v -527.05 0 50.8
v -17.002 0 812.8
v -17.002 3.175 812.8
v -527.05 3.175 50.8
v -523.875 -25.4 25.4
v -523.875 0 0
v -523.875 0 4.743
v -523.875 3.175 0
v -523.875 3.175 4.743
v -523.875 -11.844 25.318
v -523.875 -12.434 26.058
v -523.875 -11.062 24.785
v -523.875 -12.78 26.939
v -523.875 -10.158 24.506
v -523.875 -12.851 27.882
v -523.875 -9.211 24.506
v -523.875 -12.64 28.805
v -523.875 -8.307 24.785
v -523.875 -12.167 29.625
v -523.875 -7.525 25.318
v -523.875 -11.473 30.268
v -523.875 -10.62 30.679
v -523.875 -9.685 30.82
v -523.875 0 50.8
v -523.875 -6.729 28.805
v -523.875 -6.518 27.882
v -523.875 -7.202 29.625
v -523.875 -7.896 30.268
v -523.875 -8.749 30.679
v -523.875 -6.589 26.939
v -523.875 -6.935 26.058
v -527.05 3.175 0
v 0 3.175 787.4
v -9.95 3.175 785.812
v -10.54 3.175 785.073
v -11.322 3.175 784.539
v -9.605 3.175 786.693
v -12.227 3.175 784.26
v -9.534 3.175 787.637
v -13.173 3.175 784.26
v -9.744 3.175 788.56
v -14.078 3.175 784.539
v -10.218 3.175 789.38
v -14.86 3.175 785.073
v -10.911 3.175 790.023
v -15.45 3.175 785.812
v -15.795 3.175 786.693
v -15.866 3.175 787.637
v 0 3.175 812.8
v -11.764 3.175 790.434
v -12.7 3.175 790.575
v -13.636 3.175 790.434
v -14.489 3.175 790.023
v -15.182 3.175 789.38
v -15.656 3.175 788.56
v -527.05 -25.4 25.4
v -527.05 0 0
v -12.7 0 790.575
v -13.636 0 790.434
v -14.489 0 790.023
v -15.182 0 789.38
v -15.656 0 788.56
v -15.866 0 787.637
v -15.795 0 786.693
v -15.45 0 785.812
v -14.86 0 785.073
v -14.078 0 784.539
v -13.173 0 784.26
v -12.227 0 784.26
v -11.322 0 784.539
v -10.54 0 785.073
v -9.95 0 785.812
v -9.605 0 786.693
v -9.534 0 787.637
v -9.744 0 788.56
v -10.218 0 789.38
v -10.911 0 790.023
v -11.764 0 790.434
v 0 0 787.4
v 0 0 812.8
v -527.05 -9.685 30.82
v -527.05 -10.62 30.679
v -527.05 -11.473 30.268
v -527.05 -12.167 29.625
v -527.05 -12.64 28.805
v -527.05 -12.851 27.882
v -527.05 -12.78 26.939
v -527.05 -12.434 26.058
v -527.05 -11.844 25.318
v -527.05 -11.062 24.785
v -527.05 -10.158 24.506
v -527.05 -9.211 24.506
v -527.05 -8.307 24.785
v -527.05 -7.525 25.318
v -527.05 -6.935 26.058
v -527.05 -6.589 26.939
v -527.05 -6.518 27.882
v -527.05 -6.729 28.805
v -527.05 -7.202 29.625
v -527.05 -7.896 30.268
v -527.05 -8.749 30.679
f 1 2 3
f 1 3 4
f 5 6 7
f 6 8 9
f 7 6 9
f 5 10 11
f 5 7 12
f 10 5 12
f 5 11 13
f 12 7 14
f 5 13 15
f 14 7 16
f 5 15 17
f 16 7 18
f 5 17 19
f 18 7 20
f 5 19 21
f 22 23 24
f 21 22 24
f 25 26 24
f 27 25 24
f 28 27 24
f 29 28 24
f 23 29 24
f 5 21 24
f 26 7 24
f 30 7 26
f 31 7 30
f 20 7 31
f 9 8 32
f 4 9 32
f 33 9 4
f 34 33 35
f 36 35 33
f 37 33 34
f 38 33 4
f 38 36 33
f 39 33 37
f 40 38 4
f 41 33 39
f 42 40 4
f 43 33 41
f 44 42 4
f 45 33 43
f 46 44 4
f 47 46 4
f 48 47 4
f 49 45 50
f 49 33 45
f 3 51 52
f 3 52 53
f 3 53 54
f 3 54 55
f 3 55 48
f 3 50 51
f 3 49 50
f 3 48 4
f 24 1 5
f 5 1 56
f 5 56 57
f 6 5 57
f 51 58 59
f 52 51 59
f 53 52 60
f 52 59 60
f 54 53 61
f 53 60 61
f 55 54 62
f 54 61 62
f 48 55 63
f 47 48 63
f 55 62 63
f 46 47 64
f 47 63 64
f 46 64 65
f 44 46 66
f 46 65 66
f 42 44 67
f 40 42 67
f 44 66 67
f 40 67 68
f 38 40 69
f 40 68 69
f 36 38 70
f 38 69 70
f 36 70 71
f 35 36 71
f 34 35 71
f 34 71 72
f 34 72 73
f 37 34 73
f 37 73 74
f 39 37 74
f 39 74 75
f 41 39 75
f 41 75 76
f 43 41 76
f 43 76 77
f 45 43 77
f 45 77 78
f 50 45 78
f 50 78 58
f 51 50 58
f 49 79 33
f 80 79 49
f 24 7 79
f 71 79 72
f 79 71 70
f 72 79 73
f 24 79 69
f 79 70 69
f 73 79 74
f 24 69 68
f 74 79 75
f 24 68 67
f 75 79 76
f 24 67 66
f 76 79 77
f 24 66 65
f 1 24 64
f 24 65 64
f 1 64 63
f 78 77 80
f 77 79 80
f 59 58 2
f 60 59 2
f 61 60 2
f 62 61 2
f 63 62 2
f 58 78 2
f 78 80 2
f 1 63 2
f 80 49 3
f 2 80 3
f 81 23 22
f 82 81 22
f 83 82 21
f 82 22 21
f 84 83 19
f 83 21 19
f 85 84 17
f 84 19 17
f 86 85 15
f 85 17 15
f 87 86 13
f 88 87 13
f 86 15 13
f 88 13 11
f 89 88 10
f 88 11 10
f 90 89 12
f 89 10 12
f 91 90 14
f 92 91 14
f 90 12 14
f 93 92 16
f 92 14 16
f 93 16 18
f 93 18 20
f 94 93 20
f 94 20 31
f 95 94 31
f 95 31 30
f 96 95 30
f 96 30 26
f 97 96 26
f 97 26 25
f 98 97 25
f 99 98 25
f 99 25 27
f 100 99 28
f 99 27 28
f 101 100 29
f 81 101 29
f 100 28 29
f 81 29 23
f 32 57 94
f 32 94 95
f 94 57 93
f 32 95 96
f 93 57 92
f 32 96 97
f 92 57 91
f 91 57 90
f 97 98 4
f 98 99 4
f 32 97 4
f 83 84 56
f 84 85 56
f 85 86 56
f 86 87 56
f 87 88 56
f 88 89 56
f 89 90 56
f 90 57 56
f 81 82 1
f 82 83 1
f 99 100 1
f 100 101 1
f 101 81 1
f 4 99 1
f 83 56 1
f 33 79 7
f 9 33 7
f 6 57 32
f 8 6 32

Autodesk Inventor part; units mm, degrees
ref_plane "YZ Plane" through (0, 0, 0) normal (1, 0, 0) x (0, 1, 0)
ref_plane "XZ Plane" through (0, 0, 0) normal (0, 1, 0) x (-1, 0, 0)
ref_plane "XY Plane" through (0, 0, 0) normal (0, 0, 1) x (1, 0, 0)
sketch "Sketch1" plane through (0, 0, 0) normal (0, 1, 0) x (-1, 0, 0)
  line L0 (0, 0) -> (527.05, 0) construction
  line L1 (527.05, 0) -> (527.05, 787.4) construction
  line L2 (527.05, 787.4) -> (0, 787.4) construction
  line L3 (0, 787.4) -> (0, 0) construction
  line L4 (0, 787.4) -> (527.05, 0)
  line L5 (527.05, 0) -> (527.05, 50.8)
  line L6 (527.05, 0) -> (577.85, 0) construction
  line L7 (0, 787.4) -> (0, 838.2)
  line L8 (0, 787.4) -> (50.8, 787.4) construction
  line L9 (0, 838.2) -> (527.05, 50.8)
  dimension "d0" = 527.05
  dimension "d1" = 787.4
  dimension "d2" = 50.8
  dimension "d3" = 90
  dimension "d4" = 50.8
  dimension "d5" = 90
extrude "Extrusion1" add sketch "Sketch1" along normal blind 3.175
sketch "Sketch6" plane through (-527.05, 0, 0) normal (-1, 0, 0) x (0, 0, 1)
  line L0 (50.8, 0) -> (0, 0) projected
  line L1 (50.8, 0) -> (50.8, 3.175) projected
  line L2 (0, 3.175) -> (50.8, 3.175) projected
  line L3 (0, 0) -> (0, 3.175) projected
  line L4 (50.8, 0) -> (25.4, -25.4)
  line L5 (50.8, 0) -> (86.721, 0) construction
  line L6 (25.4, -25.4) -> (0, 0)
  dimension "d33" = 135
extrude "Extrusion4" add sketch "Sketch6" against normal blind 3.175
sketch "Sketch8" plane through (0, 3.175, 0) normal (0, 1, 0) x (1, 0, 0)
  line L0 (-527.05, 0) -> (-527.05, -50.8) projected
  line L1 (-527.05, -50.8) -> (0, -838.2) projected
  line L2 (0, -838.2) -> (0, -787.4) projected
  line L3 (0, -787.4) -> (-523.875, -4.7434) projected
  line L4 (-523.875, 0) -> (-523.875, -4.7434) projected
  line L5 (-527.05, 0) -> (-523.875, 0) projected
  line L6 (0, -838.2) -> (0, -812.8)
  line L7 (0, -787.4) -> (0, -838.2) projected
  line L8 (0, -812.8) -> (-17.0016, -812.8)
  line L9 (-17.0016, -812.8) -> (0, -838.2)
  line L10 (0, -838.2) -> (-527.05, -50.8) projected
  point P0 (0, 0)
extrude "Extrusion6" cut sketch "Sketch8" against normal blind 3.175 contours L8 L2 L1
sketch "Sketch9" plane through (-527.05, 0, 50.8) normal (-1, 0, 0) x (0, 0, 1)
  line L0 (0, 0) -> (0, 3.175) projected
  line L1 (-50.8, 3.175) -> (0, 3.175) projected
  line L2 (-50.8, 0) -> (-50.8, 3.175) projected
  line L3 (-50.8, 0) -> (-25.4, -25.4) projected
  line L4 (-25.4, -25.4) -> (0, 0) projected
  point P0 (-23.1549, -9.6846)
  dimension "d40" = 12.7
  dimension "d41" = 9.525
hole "Hole3" at (-527.05, -9.6846, 27.6451) direction (1, 0, 0) diameter 6.35 end through all
sketch "Sketch10" plane through (0, 3.175, 0) normal (0, 1, 0) x (1, 0, 0)
  line L0 (-17.0016, -812.8) -> (0, -812.8) projected
  line L1 (0, -812.8) -> (0, -787.4) projected
  line L2 (0, -787.4) -> (-523.875, -4.7434) projected
  line L3 (-523.875, 0) -> (-523.875, -4.7434) projected
  line L4 (-527.05, 0) -> (-523.875, 0) projected
  line L5 (-527.05, 0) -> (-527.05, -50.8) projected
  line L6 (-527.05, -50.8) -> (-17.0016, -812.8) projected
  point P0 (0, 0)
  point P1 (-12.7, -787.4)
  dimension "d52" = 12.7
  dimension "d53" = 25.4
hole "Hole4" at (-12.7, 3.175, 787.4) direction (0, -1, 0) diameter 6.35 end through all
properties part number "cross brace"
